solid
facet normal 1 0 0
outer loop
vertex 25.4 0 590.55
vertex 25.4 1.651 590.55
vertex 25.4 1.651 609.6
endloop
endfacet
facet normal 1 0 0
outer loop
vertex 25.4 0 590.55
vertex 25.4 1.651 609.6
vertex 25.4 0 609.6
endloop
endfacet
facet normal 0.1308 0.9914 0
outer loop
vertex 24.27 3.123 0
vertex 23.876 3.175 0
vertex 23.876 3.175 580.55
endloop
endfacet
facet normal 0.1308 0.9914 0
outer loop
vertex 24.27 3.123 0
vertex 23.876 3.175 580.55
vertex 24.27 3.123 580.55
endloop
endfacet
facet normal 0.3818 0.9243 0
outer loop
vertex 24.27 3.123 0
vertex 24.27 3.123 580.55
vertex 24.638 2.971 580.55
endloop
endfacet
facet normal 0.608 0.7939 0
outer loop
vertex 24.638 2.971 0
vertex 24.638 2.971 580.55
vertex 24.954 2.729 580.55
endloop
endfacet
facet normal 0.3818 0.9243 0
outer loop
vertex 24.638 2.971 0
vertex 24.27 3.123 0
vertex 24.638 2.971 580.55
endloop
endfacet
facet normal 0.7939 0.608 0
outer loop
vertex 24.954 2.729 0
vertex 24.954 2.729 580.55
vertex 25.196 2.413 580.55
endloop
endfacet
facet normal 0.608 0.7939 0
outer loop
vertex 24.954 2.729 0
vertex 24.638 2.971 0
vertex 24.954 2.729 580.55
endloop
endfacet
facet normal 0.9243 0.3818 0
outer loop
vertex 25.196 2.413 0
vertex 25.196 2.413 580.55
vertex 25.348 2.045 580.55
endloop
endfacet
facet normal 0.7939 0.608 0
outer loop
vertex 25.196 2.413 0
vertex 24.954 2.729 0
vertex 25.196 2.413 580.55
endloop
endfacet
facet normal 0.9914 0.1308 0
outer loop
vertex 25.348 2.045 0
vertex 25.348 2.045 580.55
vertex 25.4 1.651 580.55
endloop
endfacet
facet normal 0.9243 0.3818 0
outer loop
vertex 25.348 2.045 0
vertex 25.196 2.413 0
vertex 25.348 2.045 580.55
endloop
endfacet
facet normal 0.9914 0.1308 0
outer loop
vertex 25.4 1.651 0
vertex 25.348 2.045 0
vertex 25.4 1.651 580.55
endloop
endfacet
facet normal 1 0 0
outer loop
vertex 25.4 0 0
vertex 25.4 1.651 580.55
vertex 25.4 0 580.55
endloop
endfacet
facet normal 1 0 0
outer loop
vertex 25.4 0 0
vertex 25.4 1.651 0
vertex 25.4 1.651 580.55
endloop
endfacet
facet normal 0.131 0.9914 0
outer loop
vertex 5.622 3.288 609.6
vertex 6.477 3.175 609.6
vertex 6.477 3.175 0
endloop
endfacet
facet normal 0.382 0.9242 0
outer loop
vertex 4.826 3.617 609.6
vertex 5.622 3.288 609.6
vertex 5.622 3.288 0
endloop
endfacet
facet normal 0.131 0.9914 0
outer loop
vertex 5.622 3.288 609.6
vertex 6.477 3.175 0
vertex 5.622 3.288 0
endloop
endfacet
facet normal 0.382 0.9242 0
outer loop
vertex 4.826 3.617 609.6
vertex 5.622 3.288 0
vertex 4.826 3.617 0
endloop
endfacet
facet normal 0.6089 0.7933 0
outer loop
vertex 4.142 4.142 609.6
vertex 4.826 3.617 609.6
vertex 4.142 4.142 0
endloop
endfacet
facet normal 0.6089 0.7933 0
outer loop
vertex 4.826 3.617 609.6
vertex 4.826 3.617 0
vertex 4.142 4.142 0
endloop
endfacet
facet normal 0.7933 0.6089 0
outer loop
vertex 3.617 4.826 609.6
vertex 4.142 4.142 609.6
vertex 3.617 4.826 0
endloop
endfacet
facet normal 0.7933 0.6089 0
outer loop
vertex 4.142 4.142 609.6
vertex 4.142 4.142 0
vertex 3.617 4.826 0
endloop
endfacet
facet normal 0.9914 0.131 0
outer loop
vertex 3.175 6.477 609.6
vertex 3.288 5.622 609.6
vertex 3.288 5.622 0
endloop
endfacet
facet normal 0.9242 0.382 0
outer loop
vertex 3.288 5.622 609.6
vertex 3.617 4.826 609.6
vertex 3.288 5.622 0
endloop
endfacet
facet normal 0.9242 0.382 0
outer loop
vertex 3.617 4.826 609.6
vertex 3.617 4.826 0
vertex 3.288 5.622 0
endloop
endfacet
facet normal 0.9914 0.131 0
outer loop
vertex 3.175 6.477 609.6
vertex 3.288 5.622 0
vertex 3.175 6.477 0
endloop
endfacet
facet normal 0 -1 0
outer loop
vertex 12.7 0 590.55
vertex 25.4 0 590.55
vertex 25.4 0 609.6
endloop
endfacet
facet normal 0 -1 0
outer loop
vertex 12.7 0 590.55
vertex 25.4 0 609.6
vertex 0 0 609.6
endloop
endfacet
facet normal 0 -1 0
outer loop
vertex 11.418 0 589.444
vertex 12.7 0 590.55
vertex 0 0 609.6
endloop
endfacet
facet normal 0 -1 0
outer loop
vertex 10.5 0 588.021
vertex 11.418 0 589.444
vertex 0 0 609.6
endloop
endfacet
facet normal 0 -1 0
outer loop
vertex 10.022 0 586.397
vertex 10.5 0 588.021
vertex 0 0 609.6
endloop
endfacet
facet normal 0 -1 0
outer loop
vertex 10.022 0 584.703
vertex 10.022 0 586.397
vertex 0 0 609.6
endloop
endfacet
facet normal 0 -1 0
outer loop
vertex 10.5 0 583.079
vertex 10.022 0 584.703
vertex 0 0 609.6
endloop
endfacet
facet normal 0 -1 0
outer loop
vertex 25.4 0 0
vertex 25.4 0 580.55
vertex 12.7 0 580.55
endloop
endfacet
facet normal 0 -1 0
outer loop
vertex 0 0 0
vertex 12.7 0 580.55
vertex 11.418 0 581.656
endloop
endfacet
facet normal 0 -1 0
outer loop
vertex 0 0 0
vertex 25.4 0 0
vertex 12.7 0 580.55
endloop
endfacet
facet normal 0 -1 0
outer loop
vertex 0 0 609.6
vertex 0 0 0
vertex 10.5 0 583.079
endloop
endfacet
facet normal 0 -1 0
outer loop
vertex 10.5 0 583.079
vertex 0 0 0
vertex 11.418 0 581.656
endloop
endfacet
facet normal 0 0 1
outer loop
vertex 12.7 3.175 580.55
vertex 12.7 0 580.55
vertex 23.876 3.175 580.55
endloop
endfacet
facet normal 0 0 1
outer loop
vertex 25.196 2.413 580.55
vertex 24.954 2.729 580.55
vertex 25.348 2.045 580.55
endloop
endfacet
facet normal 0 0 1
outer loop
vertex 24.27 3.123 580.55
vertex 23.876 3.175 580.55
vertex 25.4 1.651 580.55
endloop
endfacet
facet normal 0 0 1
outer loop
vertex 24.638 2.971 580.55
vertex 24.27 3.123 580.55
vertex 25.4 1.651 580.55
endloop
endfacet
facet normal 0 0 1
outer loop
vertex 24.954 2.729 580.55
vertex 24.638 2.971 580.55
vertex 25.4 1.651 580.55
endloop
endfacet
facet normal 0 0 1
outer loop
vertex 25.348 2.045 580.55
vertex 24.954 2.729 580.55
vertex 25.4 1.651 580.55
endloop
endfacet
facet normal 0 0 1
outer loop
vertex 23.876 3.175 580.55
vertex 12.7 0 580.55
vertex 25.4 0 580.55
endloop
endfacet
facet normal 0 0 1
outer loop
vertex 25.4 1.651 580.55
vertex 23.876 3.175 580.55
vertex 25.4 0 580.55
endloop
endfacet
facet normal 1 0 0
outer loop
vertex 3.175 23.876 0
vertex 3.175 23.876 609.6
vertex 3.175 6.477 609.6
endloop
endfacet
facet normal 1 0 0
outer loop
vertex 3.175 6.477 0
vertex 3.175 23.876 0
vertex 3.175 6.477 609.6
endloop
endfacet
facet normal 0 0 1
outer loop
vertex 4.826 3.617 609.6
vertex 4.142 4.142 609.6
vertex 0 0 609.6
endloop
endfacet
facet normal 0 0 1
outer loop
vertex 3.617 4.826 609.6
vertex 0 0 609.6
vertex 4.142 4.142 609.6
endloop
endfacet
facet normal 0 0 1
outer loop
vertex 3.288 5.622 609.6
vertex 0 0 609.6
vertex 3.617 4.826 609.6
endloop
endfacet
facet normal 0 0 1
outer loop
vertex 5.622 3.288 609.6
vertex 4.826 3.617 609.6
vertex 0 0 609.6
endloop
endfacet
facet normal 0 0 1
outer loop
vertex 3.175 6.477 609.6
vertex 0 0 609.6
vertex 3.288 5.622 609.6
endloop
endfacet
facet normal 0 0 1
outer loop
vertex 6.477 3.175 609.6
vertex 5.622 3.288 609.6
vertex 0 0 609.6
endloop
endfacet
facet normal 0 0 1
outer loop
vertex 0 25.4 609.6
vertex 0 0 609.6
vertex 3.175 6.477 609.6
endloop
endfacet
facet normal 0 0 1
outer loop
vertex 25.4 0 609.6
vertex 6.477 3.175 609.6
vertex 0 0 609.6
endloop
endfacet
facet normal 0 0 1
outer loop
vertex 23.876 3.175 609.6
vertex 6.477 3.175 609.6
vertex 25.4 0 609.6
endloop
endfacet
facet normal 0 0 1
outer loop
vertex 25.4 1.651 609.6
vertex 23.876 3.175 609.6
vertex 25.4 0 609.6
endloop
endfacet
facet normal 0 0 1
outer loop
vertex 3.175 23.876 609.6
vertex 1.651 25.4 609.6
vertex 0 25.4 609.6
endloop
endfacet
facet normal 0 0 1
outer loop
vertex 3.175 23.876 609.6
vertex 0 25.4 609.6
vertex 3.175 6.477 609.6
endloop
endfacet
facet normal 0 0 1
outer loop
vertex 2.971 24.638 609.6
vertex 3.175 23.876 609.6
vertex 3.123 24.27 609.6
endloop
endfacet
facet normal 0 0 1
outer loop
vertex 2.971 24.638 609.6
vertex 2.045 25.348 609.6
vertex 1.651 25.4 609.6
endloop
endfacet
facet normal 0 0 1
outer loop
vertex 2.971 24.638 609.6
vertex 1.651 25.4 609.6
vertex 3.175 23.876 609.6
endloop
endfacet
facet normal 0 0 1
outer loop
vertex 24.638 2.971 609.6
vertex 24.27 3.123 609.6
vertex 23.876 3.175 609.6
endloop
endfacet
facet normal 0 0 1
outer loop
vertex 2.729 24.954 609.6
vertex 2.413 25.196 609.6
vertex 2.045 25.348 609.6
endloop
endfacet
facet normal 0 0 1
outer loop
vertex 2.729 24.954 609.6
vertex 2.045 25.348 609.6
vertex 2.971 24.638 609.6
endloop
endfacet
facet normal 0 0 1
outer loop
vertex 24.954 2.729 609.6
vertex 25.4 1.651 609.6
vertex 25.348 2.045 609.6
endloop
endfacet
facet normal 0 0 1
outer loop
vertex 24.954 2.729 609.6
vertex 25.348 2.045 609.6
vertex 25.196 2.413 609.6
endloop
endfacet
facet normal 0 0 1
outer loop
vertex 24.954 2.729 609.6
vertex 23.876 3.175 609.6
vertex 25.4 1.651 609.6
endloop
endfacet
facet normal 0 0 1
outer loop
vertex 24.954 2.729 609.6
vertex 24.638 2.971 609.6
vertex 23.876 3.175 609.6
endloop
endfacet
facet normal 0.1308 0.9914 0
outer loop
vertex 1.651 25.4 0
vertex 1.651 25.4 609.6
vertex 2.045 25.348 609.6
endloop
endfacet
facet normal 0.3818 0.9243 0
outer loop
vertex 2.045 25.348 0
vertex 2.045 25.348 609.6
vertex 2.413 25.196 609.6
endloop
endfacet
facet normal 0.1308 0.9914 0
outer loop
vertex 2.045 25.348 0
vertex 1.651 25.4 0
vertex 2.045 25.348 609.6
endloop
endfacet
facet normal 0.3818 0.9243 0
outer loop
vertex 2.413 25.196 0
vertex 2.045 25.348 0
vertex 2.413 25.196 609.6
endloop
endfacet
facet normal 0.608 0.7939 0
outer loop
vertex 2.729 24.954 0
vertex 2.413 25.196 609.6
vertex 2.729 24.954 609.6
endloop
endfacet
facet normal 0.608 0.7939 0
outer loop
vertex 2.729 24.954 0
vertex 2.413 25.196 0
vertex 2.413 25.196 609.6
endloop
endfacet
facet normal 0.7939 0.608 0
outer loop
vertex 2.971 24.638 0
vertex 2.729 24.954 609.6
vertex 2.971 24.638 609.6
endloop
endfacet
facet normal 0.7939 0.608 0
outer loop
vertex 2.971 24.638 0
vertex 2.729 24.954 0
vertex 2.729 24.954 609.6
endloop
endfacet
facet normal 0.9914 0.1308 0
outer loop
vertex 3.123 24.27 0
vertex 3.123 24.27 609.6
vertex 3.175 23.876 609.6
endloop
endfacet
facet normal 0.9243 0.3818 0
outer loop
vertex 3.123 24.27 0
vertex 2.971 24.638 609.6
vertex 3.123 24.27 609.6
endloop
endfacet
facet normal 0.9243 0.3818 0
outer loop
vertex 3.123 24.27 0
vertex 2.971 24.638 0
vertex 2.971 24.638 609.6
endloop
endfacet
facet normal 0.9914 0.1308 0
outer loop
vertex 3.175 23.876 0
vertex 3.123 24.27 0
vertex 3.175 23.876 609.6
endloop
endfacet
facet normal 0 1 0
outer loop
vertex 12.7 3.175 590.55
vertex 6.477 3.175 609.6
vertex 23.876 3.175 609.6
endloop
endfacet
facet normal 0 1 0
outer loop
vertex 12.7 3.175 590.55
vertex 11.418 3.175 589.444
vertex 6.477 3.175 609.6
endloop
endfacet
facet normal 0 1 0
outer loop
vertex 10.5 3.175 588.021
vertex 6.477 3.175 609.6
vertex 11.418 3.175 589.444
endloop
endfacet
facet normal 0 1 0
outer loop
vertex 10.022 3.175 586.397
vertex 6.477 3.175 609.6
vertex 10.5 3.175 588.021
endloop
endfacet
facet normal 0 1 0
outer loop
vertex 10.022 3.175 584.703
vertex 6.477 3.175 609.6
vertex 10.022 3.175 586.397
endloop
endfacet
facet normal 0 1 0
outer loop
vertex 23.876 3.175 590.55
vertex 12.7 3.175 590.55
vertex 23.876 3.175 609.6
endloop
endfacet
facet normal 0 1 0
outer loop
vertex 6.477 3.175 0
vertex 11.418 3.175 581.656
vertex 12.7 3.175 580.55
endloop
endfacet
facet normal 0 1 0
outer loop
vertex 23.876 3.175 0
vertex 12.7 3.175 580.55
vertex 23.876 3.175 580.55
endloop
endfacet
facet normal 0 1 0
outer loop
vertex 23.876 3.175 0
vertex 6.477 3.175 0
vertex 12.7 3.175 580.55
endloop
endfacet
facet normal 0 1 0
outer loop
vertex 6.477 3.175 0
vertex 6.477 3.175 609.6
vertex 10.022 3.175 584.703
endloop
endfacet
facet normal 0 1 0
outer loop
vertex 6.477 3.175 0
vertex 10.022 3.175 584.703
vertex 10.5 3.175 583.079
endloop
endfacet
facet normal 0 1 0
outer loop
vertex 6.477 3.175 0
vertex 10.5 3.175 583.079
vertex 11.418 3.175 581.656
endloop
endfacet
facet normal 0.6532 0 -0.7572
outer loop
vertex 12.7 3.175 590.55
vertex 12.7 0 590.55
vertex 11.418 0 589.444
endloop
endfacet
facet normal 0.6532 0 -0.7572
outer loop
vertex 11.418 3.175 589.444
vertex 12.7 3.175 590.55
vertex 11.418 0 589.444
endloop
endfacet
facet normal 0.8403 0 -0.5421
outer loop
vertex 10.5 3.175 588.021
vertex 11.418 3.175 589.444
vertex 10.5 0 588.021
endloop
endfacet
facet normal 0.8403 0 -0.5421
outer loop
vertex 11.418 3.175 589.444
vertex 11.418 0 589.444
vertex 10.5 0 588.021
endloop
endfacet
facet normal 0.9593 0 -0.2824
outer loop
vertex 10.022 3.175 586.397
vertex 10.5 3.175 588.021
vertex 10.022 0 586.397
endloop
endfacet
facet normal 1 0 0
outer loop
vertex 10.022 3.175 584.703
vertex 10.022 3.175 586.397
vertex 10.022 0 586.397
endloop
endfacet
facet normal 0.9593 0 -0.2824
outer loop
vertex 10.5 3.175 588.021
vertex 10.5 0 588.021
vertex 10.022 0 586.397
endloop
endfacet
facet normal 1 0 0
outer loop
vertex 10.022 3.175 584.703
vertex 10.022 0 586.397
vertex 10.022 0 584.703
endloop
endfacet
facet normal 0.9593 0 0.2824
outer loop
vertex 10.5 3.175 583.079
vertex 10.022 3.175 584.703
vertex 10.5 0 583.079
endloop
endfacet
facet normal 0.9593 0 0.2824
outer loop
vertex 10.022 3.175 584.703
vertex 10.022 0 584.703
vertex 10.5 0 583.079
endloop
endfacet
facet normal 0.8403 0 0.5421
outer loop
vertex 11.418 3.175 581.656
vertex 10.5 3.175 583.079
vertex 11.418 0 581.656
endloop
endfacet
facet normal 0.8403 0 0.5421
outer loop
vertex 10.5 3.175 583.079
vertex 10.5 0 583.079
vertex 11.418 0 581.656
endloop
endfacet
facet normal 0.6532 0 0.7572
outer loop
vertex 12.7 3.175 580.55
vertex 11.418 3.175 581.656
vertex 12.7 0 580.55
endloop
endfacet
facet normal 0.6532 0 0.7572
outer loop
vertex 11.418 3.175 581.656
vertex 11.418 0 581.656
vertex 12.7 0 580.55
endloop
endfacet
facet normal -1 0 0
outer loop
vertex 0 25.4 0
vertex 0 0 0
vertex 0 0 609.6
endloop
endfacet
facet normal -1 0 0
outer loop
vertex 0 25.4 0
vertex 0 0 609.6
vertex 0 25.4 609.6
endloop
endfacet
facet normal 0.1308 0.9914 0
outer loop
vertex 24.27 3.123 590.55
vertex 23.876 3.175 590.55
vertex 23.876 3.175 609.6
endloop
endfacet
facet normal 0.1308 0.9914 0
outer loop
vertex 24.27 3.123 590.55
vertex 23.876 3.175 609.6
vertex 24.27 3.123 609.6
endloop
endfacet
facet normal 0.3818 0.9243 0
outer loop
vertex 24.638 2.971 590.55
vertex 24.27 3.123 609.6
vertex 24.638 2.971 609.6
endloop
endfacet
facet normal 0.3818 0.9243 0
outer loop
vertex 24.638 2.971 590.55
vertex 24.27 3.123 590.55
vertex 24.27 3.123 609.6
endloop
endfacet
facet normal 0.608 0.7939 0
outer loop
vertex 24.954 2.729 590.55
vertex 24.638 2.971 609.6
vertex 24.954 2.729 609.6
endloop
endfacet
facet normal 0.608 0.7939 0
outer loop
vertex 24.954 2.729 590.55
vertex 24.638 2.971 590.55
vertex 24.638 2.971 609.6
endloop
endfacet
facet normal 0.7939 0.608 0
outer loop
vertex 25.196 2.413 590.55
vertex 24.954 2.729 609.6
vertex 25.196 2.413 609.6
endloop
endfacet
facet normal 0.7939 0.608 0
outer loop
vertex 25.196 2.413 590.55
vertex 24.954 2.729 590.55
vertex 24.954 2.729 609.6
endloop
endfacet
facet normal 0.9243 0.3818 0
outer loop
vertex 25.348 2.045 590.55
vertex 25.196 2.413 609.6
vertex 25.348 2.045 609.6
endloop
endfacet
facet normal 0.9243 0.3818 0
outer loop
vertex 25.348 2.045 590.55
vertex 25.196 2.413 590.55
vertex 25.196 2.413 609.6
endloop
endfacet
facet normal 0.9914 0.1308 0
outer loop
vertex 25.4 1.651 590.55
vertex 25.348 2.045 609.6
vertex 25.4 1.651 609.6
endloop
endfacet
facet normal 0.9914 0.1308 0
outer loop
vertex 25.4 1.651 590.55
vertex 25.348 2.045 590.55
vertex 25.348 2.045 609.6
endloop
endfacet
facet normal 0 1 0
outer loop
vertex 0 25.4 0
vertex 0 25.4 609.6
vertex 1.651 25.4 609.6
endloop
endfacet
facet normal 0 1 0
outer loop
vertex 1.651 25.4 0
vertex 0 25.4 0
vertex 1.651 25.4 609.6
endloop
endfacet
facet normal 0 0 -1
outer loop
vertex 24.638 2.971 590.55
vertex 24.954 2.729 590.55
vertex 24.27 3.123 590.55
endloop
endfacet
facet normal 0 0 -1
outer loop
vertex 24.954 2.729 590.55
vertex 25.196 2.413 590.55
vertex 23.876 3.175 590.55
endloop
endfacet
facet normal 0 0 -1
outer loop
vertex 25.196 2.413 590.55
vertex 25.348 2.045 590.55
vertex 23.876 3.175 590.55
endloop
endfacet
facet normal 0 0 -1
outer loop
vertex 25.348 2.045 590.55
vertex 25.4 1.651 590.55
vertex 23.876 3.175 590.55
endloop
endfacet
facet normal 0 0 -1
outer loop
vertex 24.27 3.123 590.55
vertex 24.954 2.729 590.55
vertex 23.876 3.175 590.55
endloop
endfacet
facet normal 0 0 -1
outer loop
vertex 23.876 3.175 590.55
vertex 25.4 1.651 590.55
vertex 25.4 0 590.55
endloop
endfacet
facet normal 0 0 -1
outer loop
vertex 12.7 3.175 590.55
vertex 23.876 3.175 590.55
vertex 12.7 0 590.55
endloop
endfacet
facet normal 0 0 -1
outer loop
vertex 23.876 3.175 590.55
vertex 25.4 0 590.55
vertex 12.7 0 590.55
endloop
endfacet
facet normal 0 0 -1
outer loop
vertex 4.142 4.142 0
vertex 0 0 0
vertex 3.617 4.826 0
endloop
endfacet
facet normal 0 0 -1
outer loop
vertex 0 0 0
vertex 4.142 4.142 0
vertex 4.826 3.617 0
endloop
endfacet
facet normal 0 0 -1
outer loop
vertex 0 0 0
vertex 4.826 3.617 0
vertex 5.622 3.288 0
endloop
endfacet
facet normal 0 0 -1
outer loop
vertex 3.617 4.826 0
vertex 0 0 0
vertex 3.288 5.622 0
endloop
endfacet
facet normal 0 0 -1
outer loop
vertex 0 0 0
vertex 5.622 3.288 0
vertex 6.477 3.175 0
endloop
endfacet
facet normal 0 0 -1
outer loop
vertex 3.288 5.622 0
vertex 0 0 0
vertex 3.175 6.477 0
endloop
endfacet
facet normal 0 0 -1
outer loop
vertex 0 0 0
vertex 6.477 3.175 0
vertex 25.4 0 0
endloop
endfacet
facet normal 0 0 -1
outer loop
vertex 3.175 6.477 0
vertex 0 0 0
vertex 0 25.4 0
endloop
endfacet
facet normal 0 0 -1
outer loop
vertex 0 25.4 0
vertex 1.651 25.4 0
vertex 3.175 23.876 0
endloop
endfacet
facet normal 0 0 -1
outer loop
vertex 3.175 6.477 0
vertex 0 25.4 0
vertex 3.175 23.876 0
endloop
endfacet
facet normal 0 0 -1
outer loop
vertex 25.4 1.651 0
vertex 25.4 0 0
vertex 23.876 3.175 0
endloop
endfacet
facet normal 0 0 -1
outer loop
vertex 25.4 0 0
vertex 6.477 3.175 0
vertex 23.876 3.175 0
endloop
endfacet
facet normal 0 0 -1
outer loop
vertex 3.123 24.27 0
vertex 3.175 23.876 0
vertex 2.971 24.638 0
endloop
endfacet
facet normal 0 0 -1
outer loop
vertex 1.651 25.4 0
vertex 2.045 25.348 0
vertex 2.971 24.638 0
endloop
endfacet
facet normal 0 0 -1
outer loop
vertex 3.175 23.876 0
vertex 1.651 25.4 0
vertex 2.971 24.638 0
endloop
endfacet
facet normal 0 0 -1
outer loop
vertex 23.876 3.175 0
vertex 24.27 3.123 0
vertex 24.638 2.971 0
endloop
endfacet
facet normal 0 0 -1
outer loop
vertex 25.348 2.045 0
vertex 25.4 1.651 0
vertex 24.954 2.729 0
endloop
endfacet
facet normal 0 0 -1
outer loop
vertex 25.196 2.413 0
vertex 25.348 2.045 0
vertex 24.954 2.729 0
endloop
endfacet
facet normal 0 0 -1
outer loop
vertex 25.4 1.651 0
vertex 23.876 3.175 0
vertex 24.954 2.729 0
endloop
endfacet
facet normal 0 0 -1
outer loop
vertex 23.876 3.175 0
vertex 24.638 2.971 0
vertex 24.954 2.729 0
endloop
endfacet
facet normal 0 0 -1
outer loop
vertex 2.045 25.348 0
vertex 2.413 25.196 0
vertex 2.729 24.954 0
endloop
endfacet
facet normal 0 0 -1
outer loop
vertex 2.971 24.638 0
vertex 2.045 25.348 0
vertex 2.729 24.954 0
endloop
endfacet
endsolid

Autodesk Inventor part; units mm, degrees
ref_plane "YZ Plane" through (0, 0, 0) normal (1, 0, 0) x (0, 1, 0)
ref_plane "Start plane" through (0, 0, 0) normal (0, 0, 1) x (1, 0, 0)
ref_plane "End plane" through (0, 0, 609.6) normal (0, 0, 1) x (1, 0, 0)
sketch "Sketch" plane through (0, 0, 0) normal (0, 0, 1) x (1, 0, 0)
  line L0 (25.4, 0) -> (0, 0)
  line L1 (0, 0) -> (0, 25.4)
  line L2 (0, 25.4) -> (1.651, 25.4)
  line L3 (3.175, 23.876) -> (3.175, 6.477)
  line L4 (6.477, 3.175) -> (23.876, 3.175)
  line L5 (25.4, 1.651) -> (25.4, 0)
  line L6 (0, -11.0414) -> (0, 31.5385) construction
  line L7 (-11.0414, 0) -> (31.5385, 0) construction
  arc A0 (3.175, 6.477) -> (6.477, 3.175) centre (6.477, 6.477) ccw
  arc A1 (3.175, 23.876) -> (1.651, 25.4) centre (1.651, 23.876) ccw
  arc A2 (25.4, 1.651) -> (23.876, 3.175) centre (23.876, 1.651) ccw
  line L8 (0, 40.0545) -> (0, -19.5574) construction
  line L9 (-19.5574, 0) -> (40.0545, 0) construction
  point P0 (3.175, 25.4)
  point P1 (3.175, 3.175)
  point P2 (25.4, 3.175)
  dimension "d0" = 25.4
  dimension "d1" = 25.4
  dimension "d2" = 3.175
  dimension "d3" = 3.175
  dimension "d10" = 0
  dimension "d11" = 0
  dimension "d14" = 3.302
  dimension "d15" = 1.524
extrude "Body" add sketch "Sketch" along normal up to surface (609.6 mm away) from surface at 0
sketch "Sketch3" plane through (0, 0, 0) normal (0, 0, 1) x (1, 0, 0)
  line L0 (0, 0) -> (10, 0)
ref_plane "Work Plane3" through (0, 0, 0) normal (0, -1, 0) x (1, 0, 0)
sketch "Sketch4" plane through (0, 0, 0) normal (0, -1, 0) x (1, 0, 0)
  line L0 (-2, 0) -> (12, 0)
  line L1 (-2, 609.6) -> (12, 609.6)
  dimension "d17" = 609.6
sketch "Sketch6" plane through (0, 0, 0) normal (0, -1, 0) x (1, 0, 0)
  line L0 (25.4, 590.55) -> (12.7, 590.55)
  line L1 (12.7, 580.55) -> (25.4, 580.55)
  line L2 (25.4, 580.55) -> (25.4, 590.55)
  arc A0 (12.7, 590.55) -> (12.7, 580.55) centre (15.8943, 585.55) ccw
  line L3 (25.4, 609.6) -> (0, 609.6) projected
  line L4 (25.4, 0) -> (25.4, 609.6) projected
  point P0 (0, 0)
  dimension "d23" = 12.7
  dimension "d24" = 10
  dimension "d28" = 19.05
extrude "Extrusion3" cut sketch "Sketch6" against normal up to surface (3.175 mm away)
equation "\"d0\" = G_H"
equation "\"d1\" = G_H"
equation "\"d2\" = G_T"
equation "\"d3\" = G_T"
equation "\"d14\" = G_IR"
equation "\"d15\" = G_ER"
equation "\"d4\" = G_L"
equation "\"d23\" = axle_inset_up"
equation "\"d28\" = axle_inset_fwd"
equation "\"G_H\" = 25.4"
equation "\"G_T\" = 3.175"
equation "\"G_ER\" = 1.524"
equation "\"G_IR\" = 3.302"
equation "\"G_L\" = d17"
equation "\"ex\" = 0"
equation "\"G_OFFSET_START\" = 0"
equation "\"G_OFFSET_END\" = 0"
equation "\"d13\" = G_OFFSET_END + B_L"
equation "\"B_L\" = 609.6"
equation "\"axle_inset_fwd\" = 19.05"
equation "\"axle_inset_up\" = 12.7"
properties part number "AISC - L 1 x 1 x 1/8 - 24" material "Steel, Mild"
